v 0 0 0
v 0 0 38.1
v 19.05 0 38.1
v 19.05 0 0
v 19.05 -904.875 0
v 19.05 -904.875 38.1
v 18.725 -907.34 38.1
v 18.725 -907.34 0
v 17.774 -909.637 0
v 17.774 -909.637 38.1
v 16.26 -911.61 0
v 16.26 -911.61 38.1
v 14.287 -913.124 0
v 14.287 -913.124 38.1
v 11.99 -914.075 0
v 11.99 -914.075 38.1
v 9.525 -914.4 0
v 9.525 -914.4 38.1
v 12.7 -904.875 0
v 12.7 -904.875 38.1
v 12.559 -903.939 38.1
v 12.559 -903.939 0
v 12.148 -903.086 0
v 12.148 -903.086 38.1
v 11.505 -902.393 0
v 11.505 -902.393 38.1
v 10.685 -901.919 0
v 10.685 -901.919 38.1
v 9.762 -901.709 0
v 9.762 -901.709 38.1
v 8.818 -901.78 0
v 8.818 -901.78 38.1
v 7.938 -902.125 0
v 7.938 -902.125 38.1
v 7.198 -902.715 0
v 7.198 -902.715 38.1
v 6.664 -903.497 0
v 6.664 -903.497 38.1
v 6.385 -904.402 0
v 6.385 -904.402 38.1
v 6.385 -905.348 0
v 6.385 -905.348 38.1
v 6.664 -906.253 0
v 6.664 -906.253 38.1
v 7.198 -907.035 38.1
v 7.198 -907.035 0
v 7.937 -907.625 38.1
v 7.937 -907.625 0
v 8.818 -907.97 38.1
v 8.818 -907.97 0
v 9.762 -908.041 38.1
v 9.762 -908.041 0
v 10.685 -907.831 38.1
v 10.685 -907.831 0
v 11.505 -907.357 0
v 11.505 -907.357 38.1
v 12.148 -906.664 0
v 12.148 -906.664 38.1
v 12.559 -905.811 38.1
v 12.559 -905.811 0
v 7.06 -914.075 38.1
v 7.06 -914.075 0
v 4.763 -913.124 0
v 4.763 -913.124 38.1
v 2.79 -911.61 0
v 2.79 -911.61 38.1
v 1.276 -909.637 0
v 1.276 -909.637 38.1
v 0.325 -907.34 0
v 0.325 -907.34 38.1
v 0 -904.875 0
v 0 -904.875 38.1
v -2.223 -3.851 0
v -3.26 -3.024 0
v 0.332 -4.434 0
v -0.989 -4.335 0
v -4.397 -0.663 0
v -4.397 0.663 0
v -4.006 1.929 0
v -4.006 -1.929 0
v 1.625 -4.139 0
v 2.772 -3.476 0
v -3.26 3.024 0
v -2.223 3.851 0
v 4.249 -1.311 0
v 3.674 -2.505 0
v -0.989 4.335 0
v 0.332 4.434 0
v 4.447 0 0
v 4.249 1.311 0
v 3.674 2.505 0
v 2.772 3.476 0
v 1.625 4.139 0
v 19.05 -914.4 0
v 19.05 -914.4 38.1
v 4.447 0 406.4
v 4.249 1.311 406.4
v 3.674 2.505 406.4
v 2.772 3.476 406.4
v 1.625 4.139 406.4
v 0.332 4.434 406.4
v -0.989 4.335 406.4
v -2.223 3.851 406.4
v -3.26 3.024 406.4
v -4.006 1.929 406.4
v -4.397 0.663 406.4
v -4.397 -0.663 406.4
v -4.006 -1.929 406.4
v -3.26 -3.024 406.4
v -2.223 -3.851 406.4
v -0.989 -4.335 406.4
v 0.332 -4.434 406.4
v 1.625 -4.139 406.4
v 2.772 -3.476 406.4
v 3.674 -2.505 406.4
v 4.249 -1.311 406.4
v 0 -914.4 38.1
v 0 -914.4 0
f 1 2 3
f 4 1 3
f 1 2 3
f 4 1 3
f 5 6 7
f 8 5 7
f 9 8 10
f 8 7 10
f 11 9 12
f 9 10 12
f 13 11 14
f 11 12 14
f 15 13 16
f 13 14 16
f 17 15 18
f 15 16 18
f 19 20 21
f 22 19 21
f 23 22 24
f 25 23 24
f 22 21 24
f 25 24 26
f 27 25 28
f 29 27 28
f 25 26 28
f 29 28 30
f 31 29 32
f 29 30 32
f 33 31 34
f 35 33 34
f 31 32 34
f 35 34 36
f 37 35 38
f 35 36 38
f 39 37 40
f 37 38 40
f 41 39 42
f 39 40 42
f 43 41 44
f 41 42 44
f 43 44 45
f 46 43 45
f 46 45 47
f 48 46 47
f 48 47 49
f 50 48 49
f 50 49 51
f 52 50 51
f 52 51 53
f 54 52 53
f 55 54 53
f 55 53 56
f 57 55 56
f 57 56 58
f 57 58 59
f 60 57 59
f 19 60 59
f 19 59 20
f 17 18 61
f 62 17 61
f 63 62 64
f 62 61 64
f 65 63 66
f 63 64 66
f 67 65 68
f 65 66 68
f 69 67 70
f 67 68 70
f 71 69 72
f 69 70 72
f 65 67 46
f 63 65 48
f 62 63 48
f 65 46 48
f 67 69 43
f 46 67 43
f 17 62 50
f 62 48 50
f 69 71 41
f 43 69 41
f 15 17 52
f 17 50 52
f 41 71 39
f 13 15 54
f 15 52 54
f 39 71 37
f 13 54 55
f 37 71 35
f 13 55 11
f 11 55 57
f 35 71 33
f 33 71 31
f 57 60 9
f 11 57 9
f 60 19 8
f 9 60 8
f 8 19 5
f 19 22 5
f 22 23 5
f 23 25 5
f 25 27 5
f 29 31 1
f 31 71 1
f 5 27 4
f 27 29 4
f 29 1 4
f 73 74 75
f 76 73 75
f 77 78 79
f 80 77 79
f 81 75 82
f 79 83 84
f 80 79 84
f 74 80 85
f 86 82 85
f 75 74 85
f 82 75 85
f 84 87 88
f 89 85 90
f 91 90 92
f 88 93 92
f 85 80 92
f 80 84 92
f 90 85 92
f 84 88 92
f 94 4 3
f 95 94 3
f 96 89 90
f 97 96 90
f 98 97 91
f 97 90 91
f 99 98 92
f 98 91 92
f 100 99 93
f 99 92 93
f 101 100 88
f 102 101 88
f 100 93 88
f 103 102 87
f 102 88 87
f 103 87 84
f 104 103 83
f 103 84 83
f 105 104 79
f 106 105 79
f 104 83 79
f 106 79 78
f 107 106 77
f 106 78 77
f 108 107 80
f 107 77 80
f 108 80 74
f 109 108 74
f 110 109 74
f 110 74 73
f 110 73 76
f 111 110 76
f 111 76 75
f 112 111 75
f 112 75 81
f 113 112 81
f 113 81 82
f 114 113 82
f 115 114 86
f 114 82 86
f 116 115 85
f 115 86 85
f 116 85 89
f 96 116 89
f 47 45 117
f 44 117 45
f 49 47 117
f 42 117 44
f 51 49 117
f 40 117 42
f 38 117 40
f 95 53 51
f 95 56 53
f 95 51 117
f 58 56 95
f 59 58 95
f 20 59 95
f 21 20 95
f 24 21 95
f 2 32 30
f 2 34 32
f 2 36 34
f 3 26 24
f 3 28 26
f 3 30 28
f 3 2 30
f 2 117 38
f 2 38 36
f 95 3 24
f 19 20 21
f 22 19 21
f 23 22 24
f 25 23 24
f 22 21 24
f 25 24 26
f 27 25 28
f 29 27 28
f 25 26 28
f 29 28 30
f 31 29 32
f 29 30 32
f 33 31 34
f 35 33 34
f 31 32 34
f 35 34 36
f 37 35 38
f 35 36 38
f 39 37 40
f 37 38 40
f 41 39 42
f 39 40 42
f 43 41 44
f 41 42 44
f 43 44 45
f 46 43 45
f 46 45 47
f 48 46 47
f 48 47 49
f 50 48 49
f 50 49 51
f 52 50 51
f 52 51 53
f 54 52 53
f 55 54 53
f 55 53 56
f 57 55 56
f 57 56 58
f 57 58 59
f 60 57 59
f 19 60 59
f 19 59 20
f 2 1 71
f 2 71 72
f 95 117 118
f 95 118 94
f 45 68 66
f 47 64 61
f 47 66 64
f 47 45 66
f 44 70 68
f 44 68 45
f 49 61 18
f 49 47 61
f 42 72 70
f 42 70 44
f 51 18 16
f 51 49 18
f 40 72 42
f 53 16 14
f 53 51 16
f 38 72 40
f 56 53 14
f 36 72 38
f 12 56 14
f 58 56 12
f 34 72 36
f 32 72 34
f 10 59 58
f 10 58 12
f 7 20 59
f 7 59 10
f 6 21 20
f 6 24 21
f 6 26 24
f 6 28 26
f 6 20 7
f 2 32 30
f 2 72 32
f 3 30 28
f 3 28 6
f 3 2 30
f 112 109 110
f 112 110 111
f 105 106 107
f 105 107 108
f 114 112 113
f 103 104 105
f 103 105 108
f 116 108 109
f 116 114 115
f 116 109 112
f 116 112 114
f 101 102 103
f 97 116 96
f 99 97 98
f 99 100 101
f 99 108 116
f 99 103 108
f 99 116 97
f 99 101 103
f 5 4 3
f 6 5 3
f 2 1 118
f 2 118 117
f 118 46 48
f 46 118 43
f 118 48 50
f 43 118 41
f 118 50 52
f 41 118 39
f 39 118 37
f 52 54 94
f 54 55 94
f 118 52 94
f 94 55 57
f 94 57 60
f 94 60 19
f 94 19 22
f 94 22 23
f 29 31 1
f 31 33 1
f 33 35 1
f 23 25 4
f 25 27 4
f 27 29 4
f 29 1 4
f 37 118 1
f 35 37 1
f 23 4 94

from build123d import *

# Parameters (mm, degrees)
F0_W     = 19.05
F0_H     = 38.1
F1_DEPTH = 914.4
F2_R     = 4.446562
F3_DEPTH = 406.4
F4_R     = 3.175
F5_DEPTH = 38.101
F6_DEPTH = 914.4
F7_DEPTH = 38.101


with BuildPart() as f1:
    # F0 (on Front) → F1 (new body)
    with BuildSketch(Plane.XZ):
        with Locations((9.525, 19.05)):
            Rectangle(F0_W, F0_H)
    extrude(amount=F1_DEPTH)

    # F4 (on face) → F5 (cut, through all)
    with BuildSketch(Plane.XY.offset(38.1)):
        with BuildLine():
            Line((19.05, -914.4), (19.05, -904.875))
            ThreePointArc((19.05, -904.875), (16.260192, -911.610192), (9.525, -914.4))
            Line((9.525, -914.4), (19.05, -914.4))
        make_face()
        with BuildLine():
            ThreePointArc((9.525, -914.4), (2.789808, -911.610192), (0, -904.875))
            Line((0, -904.875), (0, -914.4))
            Line((0, -914.4), (9.525, -914.4))
        make_face()
        with Locations((9.525, -904.875)):
            Circle(F4_R)
    extrude(amount=-F5_DEPTH, mode=Mode.SUBTRACT)


with BuildPart() as f3:
    # F2 (on Top) → F3 (new body)
    with BuildSketch(Plane.XY):
        Circle(F2_R)
    extrude(amount=F3_DEPTH)


with BuildPart() as f6:
    # F0 (on Front) → F6 (new body)
    with BuildSketch(Plane.XZ):
        with Locations((9.525, 19.05)):
            Rectangle(F0_W, F0_H)
    extrude(amount=F6_DEPTH)

    # F4 (on face) → F7 (cut, through all)
    with BuildSketch(Plane.XY.offset(38.1)):
        with Locations((9.525, -904.875)):
            Circle(F4_R)
    extrude(amount=-F7_DEPTH, mode=Mode.SUBTRACT)


solid = Compound([f1.part, f3.part, f6.part])
